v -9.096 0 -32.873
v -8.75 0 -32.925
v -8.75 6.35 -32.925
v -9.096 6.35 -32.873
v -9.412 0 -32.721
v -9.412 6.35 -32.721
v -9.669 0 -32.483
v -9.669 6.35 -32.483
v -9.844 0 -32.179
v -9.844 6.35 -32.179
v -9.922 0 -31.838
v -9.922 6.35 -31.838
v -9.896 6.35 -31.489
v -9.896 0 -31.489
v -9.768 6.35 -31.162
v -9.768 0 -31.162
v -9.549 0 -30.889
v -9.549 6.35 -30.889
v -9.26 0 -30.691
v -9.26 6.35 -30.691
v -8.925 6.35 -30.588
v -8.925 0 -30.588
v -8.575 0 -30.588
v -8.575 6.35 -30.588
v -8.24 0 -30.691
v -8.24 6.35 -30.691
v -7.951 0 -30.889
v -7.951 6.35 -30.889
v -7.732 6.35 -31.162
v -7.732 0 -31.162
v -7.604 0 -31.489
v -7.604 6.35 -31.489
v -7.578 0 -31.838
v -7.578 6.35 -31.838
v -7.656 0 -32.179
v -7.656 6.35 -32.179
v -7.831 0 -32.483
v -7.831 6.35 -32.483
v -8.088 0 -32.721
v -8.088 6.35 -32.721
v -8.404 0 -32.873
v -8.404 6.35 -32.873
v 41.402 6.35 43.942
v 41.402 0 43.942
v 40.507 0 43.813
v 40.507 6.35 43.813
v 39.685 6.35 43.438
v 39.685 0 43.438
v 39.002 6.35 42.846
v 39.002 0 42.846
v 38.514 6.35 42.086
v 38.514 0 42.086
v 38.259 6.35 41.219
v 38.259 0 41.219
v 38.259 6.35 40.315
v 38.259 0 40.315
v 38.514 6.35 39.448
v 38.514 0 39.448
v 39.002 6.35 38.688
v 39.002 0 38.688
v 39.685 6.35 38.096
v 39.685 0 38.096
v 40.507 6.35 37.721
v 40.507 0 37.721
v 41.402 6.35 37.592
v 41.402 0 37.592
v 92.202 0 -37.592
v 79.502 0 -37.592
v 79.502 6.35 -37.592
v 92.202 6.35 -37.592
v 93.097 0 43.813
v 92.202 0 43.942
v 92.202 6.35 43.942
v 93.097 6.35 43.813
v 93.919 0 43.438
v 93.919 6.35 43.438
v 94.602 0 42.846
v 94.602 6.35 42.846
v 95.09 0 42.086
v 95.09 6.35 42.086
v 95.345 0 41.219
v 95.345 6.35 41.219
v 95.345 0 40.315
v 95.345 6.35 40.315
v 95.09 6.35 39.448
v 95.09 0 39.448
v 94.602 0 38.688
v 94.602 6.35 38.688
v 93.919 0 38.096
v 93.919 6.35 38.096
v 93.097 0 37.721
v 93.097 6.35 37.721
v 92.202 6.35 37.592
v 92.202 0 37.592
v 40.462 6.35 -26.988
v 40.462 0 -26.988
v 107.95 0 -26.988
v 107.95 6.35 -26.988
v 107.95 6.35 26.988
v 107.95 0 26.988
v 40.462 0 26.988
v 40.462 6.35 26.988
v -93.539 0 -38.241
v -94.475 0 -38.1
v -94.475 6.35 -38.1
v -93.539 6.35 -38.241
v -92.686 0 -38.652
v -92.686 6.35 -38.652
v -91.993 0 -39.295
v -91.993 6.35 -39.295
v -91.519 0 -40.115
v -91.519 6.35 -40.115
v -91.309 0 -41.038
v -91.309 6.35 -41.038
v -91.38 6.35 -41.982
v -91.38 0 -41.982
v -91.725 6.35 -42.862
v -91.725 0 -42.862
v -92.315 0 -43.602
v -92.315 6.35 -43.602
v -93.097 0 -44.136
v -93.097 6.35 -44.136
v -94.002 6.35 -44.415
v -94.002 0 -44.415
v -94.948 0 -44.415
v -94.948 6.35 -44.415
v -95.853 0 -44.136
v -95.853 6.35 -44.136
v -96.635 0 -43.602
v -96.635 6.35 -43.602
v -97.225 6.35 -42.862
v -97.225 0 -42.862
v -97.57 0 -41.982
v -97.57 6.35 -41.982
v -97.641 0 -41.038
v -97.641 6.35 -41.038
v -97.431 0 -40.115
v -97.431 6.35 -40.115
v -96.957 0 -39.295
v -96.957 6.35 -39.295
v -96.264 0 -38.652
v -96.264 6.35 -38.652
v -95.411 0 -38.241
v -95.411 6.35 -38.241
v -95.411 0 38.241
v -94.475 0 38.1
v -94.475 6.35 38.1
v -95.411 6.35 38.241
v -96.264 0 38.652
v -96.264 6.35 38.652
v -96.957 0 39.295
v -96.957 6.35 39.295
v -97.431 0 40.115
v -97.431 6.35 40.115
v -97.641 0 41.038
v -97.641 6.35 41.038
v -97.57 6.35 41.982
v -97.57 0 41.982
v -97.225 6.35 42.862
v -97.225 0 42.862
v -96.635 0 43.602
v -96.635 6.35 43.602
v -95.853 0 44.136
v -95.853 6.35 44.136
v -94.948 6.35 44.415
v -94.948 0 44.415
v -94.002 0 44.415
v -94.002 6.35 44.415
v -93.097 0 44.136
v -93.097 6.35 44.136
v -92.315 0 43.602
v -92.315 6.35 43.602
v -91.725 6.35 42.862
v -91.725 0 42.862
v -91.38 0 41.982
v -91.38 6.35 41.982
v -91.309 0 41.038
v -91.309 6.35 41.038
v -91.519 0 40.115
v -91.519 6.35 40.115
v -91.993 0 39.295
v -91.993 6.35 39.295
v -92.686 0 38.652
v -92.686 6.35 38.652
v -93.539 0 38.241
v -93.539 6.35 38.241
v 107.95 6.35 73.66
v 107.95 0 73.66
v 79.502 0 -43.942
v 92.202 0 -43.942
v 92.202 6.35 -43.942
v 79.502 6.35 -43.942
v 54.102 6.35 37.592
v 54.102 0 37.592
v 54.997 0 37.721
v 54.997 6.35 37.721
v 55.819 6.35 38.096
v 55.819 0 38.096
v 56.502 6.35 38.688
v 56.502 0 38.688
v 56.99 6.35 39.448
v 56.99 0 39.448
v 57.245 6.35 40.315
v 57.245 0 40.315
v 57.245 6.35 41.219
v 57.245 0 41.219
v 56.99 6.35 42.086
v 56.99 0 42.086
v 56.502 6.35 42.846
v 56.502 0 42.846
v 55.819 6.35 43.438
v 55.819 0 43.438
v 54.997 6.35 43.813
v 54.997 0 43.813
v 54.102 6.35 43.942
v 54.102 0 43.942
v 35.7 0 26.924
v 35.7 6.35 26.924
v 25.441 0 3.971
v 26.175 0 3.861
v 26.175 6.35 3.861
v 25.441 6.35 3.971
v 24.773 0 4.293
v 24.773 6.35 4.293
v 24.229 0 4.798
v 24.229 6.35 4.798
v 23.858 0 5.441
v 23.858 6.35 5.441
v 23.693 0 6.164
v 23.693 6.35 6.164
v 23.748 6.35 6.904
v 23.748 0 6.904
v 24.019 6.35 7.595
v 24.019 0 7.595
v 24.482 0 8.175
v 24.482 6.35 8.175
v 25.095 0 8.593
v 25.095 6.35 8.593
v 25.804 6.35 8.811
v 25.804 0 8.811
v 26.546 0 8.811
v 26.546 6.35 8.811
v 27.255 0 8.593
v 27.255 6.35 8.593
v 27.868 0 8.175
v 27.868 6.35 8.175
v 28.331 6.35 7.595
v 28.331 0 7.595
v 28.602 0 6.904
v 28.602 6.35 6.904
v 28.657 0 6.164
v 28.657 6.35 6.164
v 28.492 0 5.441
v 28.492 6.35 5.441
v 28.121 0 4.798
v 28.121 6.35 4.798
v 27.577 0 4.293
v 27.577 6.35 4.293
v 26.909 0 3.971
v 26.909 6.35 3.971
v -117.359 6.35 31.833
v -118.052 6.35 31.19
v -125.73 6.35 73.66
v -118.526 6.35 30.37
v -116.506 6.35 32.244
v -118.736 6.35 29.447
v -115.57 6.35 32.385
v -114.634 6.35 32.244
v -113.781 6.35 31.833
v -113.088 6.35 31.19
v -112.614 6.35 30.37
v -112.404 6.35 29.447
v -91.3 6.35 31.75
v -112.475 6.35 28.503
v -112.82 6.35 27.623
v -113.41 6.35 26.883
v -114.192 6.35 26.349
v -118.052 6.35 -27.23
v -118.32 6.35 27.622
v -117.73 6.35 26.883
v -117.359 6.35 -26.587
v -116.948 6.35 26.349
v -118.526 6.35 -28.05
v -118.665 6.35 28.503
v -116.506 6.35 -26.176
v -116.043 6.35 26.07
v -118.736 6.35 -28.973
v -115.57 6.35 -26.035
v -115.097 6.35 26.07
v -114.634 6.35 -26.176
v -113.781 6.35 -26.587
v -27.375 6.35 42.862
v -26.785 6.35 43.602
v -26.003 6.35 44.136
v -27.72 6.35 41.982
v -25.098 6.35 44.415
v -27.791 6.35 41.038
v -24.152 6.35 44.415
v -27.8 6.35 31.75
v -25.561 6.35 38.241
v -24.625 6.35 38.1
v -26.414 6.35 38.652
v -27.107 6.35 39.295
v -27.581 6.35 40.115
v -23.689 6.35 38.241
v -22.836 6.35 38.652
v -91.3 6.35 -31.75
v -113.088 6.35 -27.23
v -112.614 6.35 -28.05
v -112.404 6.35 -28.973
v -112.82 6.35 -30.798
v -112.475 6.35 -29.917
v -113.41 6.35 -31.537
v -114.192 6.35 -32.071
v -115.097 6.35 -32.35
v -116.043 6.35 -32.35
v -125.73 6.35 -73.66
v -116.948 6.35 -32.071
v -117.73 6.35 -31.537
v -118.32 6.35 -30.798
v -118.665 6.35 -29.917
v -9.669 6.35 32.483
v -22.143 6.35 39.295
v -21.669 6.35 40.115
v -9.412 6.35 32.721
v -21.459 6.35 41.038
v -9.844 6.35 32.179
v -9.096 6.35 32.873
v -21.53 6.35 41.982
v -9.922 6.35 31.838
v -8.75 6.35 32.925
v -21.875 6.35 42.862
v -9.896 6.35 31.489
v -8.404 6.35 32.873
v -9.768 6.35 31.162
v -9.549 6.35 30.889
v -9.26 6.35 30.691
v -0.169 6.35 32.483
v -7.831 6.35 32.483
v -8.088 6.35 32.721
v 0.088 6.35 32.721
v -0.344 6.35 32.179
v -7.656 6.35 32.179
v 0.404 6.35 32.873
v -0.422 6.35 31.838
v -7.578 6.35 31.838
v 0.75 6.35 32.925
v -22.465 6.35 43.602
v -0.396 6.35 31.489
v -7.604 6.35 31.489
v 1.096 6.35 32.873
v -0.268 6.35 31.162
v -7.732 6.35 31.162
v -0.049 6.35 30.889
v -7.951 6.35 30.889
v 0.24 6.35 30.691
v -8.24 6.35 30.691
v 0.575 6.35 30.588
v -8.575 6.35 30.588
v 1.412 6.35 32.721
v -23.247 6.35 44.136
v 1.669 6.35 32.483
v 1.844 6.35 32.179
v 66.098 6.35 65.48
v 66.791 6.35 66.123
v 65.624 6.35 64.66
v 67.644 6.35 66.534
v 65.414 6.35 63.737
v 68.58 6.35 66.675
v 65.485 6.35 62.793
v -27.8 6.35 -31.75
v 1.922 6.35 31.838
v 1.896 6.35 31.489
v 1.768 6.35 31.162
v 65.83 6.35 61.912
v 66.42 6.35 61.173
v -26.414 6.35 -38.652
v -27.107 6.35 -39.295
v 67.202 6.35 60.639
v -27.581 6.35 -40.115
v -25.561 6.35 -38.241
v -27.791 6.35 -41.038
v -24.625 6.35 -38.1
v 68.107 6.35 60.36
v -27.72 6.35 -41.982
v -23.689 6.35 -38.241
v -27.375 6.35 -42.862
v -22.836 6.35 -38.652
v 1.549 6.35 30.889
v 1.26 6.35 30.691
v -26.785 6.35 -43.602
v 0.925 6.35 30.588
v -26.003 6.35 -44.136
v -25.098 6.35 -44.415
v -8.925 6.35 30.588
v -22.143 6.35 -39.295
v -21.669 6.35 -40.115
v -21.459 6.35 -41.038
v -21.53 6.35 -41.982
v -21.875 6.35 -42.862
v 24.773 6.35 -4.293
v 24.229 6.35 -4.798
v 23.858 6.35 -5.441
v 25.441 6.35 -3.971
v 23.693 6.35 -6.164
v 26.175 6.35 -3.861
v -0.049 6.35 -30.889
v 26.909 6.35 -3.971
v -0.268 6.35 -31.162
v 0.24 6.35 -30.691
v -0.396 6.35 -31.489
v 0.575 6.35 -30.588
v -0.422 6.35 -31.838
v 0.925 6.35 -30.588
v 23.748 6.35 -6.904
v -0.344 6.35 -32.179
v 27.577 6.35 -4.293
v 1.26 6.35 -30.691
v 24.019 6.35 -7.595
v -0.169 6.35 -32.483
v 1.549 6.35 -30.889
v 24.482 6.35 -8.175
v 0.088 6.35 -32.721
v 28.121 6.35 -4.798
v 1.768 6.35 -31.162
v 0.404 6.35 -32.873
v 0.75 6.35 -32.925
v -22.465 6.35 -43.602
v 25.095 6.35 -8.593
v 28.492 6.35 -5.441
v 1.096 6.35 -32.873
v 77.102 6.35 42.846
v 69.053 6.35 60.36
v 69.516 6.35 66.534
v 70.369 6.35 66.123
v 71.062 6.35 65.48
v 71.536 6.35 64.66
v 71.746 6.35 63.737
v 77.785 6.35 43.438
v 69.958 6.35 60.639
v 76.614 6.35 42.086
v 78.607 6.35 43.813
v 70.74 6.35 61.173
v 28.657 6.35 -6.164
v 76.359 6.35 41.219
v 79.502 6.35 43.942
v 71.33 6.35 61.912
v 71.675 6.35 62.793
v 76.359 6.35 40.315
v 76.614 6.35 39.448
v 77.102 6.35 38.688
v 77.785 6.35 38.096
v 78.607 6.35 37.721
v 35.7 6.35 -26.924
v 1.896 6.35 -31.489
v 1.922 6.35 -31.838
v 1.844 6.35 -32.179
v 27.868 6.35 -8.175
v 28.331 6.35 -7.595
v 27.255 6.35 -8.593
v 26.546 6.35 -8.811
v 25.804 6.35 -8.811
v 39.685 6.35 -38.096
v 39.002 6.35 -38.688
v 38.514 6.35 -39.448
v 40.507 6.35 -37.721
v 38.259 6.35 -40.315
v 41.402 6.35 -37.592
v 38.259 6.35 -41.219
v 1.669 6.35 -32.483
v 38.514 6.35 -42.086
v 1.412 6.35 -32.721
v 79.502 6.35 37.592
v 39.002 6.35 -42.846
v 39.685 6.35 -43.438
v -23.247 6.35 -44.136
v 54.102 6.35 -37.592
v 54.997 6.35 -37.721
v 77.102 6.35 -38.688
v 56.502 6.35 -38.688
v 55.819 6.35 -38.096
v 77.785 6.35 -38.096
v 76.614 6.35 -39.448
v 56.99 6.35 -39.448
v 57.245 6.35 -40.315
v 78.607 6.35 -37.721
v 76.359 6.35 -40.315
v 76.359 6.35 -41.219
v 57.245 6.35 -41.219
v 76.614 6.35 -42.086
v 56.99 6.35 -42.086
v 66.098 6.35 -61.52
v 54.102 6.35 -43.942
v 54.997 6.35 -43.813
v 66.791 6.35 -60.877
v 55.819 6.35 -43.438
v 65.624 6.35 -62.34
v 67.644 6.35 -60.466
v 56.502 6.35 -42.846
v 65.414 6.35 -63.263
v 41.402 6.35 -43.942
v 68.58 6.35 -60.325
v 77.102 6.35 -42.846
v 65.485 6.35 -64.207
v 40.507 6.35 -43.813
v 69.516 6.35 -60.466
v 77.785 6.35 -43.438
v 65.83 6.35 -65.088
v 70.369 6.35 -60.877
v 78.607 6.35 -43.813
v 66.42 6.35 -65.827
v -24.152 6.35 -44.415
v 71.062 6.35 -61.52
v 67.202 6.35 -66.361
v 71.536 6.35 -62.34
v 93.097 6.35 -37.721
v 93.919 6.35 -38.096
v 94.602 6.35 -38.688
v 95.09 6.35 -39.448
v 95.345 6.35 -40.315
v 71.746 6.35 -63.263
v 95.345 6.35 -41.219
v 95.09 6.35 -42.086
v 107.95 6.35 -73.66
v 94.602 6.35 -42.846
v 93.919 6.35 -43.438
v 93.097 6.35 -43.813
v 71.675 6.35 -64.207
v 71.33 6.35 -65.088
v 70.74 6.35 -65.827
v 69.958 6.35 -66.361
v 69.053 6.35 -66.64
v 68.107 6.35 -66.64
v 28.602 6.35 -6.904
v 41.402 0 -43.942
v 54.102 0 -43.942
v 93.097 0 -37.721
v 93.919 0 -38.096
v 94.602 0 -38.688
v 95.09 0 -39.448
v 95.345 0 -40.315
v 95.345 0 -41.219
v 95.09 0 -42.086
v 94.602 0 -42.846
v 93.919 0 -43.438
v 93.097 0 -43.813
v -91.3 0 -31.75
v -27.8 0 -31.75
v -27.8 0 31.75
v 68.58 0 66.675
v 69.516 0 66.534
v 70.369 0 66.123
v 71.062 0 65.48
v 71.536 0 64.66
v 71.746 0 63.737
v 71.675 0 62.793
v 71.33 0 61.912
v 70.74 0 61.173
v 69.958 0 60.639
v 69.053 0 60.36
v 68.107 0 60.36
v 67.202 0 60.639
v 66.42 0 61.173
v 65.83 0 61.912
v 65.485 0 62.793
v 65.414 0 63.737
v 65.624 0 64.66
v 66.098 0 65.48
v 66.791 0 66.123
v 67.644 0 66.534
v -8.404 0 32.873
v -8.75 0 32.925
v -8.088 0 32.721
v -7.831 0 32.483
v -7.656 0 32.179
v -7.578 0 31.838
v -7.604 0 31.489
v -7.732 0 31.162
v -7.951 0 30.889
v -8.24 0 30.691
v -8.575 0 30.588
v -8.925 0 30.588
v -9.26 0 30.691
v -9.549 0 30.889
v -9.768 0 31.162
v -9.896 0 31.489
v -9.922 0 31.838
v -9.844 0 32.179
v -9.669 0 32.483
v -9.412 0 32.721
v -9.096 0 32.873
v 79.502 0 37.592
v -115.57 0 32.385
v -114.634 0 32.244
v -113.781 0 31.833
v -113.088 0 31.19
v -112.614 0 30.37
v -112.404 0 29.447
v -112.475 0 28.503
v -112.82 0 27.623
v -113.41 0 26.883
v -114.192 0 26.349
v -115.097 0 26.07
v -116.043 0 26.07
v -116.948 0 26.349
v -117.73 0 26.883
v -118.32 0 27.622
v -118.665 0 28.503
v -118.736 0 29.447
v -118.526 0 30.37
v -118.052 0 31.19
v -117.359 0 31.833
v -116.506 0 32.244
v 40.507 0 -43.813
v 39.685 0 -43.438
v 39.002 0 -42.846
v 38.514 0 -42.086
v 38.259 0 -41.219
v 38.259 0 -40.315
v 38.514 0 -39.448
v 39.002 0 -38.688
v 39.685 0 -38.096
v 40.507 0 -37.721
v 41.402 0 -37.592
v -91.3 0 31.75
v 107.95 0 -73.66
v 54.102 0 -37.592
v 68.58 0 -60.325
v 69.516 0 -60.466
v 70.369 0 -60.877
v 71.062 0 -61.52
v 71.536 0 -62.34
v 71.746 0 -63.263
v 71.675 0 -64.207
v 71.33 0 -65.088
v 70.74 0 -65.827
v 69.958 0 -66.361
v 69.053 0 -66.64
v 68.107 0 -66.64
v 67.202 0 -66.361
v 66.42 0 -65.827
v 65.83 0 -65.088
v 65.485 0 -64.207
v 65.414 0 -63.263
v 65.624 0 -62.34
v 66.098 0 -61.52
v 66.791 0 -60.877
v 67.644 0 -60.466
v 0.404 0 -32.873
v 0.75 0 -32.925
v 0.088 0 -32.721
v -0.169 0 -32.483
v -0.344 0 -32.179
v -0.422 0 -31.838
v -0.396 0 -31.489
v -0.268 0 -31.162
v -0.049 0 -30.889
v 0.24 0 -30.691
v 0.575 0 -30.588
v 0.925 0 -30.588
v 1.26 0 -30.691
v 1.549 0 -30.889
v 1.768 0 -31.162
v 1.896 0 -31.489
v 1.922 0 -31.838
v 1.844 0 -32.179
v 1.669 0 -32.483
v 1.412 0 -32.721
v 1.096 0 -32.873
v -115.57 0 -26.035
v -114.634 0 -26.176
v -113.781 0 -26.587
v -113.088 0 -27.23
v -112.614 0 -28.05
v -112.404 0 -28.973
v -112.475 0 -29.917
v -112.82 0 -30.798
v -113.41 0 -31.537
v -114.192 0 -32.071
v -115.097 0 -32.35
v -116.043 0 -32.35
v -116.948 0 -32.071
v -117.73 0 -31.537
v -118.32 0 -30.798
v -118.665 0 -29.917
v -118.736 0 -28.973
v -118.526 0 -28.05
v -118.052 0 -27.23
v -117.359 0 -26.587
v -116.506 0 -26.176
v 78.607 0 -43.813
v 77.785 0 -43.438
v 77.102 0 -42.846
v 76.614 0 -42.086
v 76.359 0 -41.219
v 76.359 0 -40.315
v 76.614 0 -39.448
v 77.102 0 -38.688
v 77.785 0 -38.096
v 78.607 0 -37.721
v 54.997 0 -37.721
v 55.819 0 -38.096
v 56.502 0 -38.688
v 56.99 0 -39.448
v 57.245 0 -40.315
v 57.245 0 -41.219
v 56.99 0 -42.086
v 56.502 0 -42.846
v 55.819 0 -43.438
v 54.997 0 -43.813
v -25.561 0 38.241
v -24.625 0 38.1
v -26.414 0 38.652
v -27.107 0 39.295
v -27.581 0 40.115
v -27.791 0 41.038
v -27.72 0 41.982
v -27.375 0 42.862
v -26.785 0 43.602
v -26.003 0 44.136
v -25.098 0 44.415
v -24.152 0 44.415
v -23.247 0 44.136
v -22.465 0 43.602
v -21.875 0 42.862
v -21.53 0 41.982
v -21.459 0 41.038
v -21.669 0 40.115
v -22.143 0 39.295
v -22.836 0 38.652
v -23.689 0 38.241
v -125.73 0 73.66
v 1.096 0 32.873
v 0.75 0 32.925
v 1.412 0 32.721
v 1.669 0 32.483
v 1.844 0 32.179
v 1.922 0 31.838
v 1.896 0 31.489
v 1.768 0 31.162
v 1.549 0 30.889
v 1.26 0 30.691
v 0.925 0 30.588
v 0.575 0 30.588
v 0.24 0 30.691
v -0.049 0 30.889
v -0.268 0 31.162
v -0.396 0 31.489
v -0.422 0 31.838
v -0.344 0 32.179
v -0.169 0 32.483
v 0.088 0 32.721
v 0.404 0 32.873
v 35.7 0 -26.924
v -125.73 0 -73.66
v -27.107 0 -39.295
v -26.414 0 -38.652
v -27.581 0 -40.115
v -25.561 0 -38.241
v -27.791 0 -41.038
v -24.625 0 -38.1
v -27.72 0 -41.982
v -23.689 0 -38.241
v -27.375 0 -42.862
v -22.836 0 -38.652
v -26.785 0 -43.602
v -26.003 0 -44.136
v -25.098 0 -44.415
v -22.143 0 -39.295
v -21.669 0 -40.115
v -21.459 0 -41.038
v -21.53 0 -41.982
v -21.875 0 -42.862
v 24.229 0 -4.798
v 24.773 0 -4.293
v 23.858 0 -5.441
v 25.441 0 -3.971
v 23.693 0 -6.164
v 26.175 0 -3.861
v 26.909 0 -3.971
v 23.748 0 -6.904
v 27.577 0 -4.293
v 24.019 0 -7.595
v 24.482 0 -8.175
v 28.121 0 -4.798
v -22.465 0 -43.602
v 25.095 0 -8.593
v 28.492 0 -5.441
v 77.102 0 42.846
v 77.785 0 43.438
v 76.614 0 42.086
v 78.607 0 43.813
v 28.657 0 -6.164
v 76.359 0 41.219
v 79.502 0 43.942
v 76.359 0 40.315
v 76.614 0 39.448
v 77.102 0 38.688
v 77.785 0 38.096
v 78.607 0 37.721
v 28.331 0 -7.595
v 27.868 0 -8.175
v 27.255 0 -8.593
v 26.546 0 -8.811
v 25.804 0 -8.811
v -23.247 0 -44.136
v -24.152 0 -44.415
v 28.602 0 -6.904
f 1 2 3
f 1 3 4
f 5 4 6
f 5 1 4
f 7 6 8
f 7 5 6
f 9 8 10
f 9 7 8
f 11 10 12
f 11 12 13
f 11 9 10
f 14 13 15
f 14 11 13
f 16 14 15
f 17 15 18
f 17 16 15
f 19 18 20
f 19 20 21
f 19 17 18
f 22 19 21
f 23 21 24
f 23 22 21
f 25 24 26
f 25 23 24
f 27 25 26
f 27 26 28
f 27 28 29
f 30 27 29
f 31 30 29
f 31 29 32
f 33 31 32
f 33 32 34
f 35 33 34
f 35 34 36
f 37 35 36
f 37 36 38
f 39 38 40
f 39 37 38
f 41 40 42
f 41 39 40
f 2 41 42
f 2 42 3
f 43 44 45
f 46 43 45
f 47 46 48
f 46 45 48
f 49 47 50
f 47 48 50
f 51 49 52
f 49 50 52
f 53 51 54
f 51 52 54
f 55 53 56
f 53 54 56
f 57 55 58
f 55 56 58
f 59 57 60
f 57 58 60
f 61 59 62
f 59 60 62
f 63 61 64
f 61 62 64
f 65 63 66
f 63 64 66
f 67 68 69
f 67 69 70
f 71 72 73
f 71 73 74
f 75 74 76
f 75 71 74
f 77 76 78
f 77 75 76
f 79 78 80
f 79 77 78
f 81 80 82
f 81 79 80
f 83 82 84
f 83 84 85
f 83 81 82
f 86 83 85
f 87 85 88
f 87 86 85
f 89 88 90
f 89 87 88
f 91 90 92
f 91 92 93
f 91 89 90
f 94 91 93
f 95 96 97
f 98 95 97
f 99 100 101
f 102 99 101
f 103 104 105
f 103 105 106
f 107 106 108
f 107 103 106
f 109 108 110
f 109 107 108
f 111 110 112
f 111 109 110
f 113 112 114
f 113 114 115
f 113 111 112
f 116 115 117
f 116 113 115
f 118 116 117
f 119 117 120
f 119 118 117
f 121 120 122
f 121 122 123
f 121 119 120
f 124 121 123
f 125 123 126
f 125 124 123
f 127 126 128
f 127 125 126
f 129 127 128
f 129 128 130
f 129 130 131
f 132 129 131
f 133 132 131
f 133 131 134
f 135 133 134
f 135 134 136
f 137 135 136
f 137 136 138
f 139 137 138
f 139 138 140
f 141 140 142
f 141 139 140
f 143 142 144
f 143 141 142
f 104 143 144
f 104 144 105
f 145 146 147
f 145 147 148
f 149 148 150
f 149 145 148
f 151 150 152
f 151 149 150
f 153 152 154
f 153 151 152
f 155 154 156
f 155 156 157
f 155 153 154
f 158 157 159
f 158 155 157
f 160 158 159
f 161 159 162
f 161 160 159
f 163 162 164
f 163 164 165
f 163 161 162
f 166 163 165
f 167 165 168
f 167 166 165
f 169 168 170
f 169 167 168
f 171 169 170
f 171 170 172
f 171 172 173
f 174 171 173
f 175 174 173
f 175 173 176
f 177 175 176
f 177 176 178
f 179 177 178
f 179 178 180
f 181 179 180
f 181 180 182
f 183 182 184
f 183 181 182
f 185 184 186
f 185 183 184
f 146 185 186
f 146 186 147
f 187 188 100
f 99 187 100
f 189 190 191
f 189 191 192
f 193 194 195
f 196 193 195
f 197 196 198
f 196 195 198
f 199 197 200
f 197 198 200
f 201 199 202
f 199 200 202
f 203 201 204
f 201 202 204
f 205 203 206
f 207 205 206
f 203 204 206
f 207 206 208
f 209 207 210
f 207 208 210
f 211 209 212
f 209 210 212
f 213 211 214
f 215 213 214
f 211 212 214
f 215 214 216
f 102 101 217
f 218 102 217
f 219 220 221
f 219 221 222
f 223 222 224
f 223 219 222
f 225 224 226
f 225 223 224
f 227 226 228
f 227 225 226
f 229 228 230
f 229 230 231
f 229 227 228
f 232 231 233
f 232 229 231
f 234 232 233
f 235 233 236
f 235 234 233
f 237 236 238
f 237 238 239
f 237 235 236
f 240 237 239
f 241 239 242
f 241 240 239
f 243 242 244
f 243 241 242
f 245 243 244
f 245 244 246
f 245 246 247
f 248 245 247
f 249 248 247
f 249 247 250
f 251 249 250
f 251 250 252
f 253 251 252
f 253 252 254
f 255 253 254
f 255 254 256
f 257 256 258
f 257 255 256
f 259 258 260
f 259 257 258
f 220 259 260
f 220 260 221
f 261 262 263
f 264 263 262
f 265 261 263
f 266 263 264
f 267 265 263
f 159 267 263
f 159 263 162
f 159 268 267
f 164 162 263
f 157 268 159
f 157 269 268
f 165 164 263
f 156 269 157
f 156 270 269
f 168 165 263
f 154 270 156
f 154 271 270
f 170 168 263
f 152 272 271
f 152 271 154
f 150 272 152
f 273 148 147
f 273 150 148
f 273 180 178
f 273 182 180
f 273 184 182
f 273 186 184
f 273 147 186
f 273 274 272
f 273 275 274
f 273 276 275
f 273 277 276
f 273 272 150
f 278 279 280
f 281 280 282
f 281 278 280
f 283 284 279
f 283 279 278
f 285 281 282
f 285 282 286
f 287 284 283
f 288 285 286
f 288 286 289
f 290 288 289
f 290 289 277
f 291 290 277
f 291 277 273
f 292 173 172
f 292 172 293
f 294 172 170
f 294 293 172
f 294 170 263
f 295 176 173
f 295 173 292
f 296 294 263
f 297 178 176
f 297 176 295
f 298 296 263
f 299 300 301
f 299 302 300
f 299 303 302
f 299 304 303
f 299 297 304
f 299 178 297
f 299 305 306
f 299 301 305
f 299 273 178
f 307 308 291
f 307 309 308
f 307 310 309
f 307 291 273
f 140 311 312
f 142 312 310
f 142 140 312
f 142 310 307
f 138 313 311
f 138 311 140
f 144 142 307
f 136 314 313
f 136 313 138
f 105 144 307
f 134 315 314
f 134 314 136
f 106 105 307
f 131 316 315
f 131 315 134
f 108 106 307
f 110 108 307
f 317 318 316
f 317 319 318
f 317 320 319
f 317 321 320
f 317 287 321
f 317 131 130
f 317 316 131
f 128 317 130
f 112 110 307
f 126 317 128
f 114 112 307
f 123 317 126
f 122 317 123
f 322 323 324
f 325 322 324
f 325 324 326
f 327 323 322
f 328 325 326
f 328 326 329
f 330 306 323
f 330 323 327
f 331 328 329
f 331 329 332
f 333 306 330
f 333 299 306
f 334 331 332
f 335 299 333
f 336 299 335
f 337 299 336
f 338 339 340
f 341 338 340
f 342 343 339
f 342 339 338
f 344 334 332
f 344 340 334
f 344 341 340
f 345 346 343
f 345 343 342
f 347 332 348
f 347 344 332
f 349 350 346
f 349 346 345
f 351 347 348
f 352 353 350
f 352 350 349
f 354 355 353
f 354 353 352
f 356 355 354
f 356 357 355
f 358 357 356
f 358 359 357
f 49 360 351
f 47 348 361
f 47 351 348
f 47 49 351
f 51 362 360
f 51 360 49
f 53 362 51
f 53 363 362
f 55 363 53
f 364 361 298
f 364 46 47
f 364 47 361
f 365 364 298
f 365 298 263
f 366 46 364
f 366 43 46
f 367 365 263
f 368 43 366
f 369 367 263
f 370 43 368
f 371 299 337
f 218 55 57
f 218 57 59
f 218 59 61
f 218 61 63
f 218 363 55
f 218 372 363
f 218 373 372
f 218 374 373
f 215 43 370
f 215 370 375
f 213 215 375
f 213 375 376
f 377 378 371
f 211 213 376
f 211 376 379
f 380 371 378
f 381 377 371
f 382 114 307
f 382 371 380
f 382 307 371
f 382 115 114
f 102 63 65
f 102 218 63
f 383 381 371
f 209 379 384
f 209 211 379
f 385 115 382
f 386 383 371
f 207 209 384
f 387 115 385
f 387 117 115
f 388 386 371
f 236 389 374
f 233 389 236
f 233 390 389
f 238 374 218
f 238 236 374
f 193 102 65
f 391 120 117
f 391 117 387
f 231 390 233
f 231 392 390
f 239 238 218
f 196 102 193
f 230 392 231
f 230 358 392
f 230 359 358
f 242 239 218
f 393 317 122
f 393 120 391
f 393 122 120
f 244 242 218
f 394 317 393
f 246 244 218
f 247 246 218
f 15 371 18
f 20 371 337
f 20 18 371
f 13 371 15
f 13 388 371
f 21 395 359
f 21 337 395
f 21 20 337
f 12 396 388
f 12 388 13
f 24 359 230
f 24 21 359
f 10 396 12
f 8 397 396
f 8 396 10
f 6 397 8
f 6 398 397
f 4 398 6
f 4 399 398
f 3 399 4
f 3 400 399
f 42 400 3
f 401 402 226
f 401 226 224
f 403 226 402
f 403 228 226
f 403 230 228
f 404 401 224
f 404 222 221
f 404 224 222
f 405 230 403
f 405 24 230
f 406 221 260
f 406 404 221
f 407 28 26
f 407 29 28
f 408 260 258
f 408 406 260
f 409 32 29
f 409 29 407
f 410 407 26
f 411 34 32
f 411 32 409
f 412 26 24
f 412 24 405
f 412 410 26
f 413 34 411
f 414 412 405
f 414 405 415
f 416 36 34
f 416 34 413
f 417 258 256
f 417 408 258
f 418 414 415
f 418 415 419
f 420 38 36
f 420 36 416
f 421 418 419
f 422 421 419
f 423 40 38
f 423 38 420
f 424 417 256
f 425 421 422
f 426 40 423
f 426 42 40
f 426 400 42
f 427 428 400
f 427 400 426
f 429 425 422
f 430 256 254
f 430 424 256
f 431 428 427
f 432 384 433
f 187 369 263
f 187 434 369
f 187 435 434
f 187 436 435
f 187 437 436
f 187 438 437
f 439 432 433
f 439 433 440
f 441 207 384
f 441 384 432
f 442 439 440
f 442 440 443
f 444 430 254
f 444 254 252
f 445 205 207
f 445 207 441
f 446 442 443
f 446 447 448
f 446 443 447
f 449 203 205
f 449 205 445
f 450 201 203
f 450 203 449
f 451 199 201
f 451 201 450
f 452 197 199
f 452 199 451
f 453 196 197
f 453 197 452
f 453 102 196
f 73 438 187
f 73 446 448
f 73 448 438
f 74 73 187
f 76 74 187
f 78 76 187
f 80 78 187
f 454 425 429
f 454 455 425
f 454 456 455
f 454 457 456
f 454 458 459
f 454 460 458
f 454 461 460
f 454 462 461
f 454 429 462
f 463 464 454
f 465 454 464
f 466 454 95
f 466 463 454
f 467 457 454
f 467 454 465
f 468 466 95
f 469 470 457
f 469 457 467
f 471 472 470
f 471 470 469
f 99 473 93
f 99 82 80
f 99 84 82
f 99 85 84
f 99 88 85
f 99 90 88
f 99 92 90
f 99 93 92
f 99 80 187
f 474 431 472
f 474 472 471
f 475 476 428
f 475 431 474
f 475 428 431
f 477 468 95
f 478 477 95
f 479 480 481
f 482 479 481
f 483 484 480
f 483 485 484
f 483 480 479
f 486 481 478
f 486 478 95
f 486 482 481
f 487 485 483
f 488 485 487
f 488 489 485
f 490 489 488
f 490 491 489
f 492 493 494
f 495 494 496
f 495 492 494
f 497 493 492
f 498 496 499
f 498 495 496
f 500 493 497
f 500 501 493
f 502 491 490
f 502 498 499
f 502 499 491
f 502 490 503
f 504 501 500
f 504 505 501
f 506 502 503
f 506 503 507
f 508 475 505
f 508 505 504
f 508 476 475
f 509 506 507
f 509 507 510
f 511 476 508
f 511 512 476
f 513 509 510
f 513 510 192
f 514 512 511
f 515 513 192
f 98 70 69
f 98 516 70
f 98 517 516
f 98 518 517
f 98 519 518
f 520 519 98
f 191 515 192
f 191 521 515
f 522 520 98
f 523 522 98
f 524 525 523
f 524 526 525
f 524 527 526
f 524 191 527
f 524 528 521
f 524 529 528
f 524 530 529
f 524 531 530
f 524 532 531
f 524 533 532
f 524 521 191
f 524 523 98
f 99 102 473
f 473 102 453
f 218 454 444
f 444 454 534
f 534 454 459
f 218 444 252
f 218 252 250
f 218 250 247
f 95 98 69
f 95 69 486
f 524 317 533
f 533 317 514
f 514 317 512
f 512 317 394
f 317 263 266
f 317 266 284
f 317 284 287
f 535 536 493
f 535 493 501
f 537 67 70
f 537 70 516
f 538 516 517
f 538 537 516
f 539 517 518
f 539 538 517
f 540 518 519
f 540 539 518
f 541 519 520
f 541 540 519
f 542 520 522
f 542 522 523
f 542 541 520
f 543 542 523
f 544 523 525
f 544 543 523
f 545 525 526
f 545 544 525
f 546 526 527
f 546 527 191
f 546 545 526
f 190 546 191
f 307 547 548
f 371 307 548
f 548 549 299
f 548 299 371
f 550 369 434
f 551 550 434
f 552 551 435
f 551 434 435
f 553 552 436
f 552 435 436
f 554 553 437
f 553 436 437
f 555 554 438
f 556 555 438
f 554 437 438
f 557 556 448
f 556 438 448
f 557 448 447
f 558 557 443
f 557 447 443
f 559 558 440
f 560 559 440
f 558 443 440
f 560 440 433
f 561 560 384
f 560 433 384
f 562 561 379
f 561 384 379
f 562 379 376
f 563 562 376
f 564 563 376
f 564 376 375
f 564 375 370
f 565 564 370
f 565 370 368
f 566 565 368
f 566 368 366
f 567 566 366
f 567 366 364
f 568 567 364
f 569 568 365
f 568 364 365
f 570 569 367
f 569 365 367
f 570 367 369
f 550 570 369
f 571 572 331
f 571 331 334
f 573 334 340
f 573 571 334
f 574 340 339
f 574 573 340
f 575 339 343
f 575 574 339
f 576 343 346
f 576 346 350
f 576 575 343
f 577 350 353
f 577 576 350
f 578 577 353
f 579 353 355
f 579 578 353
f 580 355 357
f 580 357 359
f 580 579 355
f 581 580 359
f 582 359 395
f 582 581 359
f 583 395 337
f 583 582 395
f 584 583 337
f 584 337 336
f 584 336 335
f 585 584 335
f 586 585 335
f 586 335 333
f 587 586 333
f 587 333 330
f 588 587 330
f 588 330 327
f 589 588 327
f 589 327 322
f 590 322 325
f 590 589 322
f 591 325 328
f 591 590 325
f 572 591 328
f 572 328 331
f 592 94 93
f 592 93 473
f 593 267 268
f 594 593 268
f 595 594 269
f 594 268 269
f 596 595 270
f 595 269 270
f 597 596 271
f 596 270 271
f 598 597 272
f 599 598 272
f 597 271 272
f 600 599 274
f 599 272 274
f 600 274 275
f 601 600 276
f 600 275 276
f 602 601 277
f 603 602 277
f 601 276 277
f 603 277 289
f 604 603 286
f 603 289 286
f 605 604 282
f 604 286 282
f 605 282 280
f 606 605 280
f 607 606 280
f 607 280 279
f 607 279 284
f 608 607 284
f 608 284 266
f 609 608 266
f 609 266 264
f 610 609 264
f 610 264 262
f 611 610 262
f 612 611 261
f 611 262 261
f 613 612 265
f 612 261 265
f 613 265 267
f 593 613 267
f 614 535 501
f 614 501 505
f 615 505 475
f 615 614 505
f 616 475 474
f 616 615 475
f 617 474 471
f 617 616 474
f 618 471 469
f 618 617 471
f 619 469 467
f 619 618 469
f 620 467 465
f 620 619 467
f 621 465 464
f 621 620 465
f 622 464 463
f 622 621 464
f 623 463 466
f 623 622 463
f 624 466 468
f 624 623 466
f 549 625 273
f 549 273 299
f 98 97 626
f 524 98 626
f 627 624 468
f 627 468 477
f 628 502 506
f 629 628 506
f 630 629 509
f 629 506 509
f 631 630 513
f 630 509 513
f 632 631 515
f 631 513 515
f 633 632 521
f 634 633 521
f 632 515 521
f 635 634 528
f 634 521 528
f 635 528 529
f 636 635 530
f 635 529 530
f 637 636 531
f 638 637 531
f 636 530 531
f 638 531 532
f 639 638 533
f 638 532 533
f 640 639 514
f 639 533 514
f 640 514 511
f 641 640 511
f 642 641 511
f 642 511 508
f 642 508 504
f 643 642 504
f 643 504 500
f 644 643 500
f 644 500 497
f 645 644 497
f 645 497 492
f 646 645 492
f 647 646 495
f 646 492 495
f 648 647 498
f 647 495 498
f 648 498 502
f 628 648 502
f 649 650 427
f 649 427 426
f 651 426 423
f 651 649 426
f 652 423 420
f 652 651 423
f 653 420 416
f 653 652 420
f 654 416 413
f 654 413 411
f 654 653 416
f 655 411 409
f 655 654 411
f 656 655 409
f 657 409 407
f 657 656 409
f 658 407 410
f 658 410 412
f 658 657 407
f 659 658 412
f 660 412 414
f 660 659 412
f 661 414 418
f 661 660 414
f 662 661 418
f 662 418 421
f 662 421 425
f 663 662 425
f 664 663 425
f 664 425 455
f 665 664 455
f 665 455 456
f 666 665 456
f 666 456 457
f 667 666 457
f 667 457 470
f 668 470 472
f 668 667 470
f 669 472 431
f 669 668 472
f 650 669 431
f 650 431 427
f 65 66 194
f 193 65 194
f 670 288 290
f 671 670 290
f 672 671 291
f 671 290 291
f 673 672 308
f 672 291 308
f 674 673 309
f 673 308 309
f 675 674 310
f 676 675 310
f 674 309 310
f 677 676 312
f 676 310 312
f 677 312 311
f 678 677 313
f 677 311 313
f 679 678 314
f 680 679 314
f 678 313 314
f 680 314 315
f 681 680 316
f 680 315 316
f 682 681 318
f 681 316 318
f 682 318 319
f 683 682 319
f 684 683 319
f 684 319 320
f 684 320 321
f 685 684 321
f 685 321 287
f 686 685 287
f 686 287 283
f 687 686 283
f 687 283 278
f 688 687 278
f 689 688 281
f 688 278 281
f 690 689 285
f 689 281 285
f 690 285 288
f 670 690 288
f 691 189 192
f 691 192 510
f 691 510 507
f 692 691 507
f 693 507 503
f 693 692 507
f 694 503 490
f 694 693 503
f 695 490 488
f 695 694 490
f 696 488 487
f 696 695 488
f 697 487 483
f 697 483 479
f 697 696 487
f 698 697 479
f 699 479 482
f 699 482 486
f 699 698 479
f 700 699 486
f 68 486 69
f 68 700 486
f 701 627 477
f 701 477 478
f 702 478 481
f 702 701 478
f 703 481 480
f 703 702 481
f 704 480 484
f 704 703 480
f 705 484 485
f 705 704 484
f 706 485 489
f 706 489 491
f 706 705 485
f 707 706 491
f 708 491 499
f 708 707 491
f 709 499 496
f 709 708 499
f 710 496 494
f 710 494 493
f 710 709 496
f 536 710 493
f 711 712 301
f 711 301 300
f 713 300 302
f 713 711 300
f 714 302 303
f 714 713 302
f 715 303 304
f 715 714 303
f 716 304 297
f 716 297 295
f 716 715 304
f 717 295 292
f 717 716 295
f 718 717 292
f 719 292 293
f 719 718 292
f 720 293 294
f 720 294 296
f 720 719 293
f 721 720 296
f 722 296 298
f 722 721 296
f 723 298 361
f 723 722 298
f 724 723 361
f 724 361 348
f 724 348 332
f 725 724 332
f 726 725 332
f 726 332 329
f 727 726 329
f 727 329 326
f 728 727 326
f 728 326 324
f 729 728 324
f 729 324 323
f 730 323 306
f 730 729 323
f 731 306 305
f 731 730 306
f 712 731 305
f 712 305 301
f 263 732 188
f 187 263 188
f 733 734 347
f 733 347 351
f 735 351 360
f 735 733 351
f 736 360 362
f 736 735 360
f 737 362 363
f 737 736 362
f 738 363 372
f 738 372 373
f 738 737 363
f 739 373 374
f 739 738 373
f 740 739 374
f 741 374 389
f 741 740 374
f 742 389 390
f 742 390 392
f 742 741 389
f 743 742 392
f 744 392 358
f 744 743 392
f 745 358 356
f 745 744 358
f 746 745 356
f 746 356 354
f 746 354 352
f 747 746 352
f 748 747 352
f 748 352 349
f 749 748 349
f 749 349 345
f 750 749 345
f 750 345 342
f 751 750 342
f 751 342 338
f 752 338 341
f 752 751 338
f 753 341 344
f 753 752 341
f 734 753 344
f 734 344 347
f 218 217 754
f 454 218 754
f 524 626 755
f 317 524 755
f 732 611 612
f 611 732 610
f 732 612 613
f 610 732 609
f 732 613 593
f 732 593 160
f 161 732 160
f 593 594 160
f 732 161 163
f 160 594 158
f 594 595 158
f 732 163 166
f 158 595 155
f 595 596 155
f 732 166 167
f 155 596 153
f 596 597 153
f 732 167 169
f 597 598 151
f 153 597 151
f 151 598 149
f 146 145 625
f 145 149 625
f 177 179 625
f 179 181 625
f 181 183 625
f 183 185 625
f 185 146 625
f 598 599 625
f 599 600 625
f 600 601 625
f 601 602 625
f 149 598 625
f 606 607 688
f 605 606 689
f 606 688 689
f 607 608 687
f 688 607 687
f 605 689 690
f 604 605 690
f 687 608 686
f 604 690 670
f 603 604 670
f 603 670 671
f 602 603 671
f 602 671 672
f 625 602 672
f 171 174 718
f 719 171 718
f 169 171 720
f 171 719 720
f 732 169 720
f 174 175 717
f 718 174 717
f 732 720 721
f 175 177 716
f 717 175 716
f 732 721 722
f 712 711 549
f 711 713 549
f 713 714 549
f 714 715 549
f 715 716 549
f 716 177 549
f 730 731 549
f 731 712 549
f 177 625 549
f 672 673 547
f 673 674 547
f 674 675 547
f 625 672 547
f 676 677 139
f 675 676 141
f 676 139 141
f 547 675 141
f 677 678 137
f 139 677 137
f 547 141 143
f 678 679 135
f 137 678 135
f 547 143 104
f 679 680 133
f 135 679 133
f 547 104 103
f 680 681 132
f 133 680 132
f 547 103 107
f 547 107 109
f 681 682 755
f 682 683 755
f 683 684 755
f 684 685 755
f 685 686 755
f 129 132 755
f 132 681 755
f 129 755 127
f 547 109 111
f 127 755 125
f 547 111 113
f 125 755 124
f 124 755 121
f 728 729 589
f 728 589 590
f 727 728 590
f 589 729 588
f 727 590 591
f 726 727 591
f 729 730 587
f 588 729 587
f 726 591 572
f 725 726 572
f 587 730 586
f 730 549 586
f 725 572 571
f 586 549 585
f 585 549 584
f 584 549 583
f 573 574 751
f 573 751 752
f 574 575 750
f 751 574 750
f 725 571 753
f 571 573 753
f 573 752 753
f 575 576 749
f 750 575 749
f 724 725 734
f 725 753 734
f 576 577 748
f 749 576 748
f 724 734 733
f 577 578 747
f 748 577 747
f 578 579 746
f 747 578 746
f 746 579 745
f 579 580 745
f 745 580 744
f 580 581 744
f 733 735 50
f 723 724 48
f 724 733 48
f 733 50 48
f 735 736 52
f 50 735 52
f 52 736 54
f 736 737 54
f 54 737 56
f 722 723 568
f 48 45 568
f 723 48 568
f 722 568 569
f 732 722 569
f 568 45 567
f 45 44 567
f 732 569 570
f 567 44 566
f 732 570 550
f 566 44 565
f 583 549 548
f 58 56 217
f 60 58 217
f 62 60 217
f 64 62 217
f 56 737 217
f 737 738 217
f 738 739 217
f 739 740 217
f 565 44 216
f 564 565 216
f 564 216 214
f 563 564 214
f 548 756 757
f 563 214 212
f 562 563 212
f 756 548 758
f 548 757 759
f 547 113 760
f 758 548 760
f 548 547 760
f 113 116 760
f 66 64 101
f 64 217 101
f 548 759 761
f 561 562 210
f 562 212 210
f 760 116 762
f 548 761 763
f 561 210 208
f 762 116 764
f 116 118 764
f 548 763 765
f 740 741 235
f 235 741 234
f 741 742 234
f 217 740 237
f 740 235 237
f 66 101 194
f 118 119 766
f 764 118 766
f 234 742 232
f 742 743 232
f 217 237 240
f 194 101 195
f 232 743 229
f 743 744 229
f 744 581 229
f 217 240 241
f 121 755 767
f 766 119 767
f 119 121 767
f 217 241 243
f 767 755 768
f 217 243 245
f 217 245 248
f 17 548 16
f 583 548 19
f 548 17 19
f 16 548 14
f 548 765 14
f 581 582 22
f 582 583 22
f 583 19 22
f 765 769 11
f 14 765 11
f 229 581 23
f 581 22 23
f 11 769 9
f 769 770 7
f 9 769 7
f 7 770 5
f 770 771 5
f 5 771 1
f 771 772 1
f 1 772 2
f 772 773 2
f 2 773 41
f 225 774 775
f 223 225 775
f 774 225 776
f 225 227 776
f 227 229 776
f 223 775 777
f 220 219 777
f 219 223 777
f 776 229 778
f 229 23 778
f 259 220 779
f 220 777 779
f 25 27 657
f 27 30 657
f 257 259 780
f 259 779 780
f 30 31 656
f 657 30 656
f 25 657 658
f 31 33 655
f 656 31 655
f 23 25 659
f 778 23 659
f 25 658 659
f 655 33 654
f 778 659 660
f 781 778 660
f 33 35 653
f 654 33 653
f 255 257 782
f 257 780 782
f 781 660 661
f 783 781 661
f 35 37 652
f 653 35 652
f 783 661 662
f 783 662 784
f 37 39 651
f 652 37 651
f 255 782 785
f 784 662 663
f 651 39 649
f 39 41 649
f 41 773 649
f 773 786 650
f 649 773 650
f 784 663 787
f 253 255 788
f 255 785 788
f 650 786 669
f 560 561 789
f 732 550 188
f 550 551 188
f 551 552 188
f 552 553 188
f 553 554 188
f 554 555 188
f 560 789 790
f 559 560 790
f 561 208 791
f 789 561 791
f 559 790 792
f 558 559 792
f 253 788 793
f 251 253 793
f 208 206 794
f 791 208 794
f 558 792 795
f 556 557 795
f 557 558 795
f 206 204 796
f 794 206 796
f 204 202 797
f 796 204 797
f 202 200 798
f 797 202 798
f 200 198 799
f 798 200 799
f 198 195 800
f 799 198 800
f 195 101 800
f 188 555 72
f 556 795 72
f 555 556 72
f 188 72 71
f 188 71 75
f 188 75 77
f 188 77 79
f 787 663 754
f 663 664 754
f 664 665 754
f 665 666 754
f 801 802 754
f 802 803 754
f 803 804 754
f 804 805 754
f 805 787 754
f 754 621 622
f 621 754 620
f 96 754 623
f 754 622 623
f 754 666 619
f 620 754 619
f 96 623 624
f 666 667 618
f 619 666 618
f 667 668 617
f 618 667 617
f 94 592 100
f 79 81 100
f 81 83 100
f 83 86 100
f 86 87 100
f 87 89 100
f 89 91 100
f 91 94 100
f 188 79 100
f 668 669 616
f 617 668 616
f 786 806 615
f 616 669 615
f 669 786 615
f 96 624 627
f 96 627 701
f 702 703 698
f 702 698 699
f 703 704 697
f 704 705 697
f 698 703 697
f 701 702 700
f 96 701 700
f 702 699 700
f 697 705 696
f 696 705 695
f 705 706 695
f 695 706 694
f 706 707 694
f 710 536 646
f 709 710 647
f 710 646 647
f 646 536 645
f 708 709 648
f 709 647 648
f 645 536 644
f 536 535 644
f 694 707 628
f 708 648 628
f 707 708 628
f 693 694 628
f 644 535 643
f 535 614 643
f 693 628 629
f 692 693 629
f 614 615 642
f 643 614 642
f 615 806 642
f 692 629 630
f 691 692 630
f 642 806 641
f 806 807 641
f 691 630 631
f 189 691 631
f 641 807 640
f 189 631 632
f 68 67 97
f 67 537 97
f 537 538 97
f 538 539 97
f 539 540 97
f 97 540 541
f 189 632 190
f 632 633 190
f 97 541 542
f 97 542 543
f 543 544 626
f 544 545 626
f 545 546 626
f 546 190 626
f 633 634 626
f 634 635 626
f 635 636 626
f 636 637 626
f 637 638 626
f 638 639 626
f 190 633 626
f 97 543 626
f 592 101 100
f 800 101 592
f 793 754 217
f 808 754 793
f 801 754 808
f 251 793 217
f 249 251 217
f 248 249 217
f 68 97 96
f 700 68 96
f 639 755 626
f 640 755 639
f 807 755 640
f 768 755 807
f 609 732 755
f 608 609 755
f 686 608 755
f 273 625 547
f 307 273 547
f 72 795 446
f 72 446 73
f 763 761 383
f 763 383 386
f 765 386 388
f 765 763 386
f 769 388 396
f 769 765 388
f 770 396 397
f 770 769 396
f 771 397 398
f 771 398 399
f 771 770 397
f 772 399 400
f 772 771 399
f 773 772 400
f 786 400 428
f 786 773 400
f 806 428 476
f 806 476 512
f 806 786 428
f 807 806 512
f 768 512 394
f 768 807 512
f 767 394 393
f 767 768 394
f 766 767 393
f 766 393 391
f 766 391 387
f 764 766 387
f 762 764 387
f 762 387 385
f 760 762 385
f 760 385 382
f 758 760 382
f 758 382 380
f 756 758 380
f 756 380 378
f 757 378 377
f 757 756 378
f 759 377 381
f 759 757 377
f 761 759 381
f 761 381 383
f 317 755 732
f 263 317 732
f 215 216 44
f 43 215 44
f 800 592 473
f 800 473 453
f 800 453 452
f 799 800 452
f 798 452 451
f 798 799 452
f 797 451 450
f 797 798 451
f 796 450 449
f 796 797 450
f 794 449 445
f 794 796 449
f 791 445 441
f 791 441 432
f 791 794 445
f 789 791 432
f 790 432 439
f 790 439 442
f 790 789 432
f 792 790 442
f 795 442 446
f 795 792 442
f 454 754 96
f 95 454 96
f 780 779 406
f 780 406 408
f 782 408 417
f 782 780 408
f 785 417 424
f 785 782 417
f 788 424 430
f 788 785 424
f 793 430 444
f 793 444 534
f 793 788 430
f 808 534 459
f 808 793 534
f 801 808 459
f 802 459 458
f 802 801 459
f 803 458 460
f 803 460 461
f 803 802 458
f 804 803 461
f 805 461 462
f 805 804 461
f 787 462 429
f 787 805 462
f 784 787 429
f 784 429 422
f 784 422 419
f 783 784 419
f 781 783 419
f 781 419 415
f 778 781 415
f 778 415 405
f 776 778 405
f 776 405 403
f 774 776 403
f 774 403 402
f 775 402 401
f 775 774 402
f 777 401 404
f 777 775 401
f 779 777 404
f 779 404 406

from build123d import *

# Parameters (mm, degrees)
SKETCH1_R           = 1.175004
SKETCH1_R_2         = 2.4892
SKETCH1_R_3         = 3.175
SKETCH1_W           = 63.5
SKETCH1_H           = 63.5
BOSS_EXTRUDE1_DEPTH = 6.35
SKETCH3_R           = 3.175
CUT_EXTRUDE1_DEPTH  = 6.35


with BuildPart() as part:
    # Sketch1 → Boss-Extrude1 (new body)
    with BuildSketch(Plane(origin=(0, 0, 0), x_dir=(1, 0, 0), z_dir=(0, 1, 0))):
        Polygon((-107.95, -73.66), (107.95, -73.66), (107.95, -26.9875), (40.462499974, -26.9875), (35.699999974, -26.924), (35.699999974, 26.924), (40.462499974, 26.9875), (107.95, 26.9875), (107.95, 73.66), (-107.95, 73.66), (-125.73, 73.66), (-125.73, -73.66), align=None)
        with Locations(Location((0.750006374, -31.75, 0), (0, 0, 270))):
            Circle(SKETCH1_R, mode=Mode.SUBTRACT)
        with Locations(Location((26.174999974, 6.35, 0), (0, 0, 270))):
            Circle(SKETCH1_R_2, mode=Mode.SUBTRACT)
        with Locations(Location((26.174999974, -6.35, 0), (0, 0, 90))):
            Circle(SKETCH1_R_2, mode=Mode.SUBTRACT)
        with Locations(Location((-8.750000026, -31.75, 0), (0, 0, 270))):
            Circle(SKETCH1_R, mode=Mode.SUBTRACT)
        with Locations(Location((-94.475000026, -41.275, 0), (0, 0, 90))):
            Circle(SKETCH1_R_3, mode=Mode.SUBTRACT)
        with Locations(Location((-24.625000026, -41.275, 0), (0, 0, 90))):
            Circle(SKETCH1_R_3, mode=Mode.SUBTRACT)
        with Locations(Location((-8.750000026, 31.75, 0), (0, 0, 90))):
            Circle(SKETCH1_R, mode=Mode.SUBTRACT)
        with Locations(Location((-94.475000026, 41.275, 0), (0, 0, 270))):
            Circle(SKETCH1_R_3, mode=Mode.SUBTRACT)
        with Locations(Location((-24.625000026, 41.275, 0), (0, 0, 270))):
            Circle(SKETCH1_R_3, mode=Mode.SUBTRACT)
        with Locations(Location((0.750006374, 31.75, 0), (0, 0, 90))):
            Circle(SKETCH1_R, mode=Mode.SUBTRACT)
        with BuildLine():
            Line((79.502, 37.592), (92.202, 37.592))
            ThreePointArc((92.202, 37.592), (95.377, 40.767), (92.202, 43.942))
            Line((92.202, 43.942), (79.502, 43.942))
            ThreePointArc((79.502, 43.942), (76.327, 40.767), (79.502, 37.592))
        make_face(mode=Mode.SUBTRACT)
        with BuildLine():
            Line((41.402, 37.592), (54.102, 37.592))
            ThreePointArc((54.102, 37.592), (57.277, 40.767), (54.102, 43.942))
            Line((54.102, 43.942), (41.402, 43.942))
            ThreePointArc((41.402, 43.942), (38.227, 40.767), (41.402, 37.592))
        make_face(mode=Mode.SUBTRACT)
        with BuildLine():
            Line((79.502, -43.942), (92.202, -43.942))
            ThreePointArc((92.202, -43.942), (95.377, -40.767), (92.202, -37.592))
            Line((92.202, -37.592), (79.502, -37.592))
            ThreePointArc((79.502, -37.592), (76.327, -40.767), (79.502, -43.942))
        make_face(mode=Mode.SUBTRACT)
        with BuildLine():
            Line((41.402, -37.592), (54.102, -37.592))
            ThreePointArc((54.102, -37.592), (57.277, -40.767), (54.102, -43.942))
            Line((54.102, -43.942), (41.402, -43.942))
            ThreePointArc((41.402, -43.942), (38.227, -40.767), (41.402, -37.592))
        make_face(mode=Mode.SUBTRACT)
        with Locations((-59.550000026, 0)):
            Rectangle(SKETCH1_W, SKETCH1_H, mode=Mode.SUBTRACT)
    extrude(amount=BOSS_EXTRUDE1_DEPTH)

    # Sketch3 → Cut-Extrude1 (cut)
    with BuildSketch(Plane(origin=(0, 6.35, 0), x_dir=(1, 0, 0), z_dir=(0, 1, 0))):
        with Locations(Location((-115.57, 29.21, 0), (0, 0, 270))):
            Circle(SKETCH3_R)
        with Locations(Location((-115.57, -29.21, 0), (0, 0, 270))):
            Circle(SKETCH3_R)
        with Locations(Location((68.58, 63.5, 0), (0, 0, 270))):
            Circle(SKETCH3_R)
        with Locations(Location((68.58, -63.5, 0), (0, 0, 270))):
            Circle(SKETCH3_R)
    extrude(amount=-CUT_EXTRUDE1_DEPTH, mode=Mode.SUBTRACT)


solid = part.part
